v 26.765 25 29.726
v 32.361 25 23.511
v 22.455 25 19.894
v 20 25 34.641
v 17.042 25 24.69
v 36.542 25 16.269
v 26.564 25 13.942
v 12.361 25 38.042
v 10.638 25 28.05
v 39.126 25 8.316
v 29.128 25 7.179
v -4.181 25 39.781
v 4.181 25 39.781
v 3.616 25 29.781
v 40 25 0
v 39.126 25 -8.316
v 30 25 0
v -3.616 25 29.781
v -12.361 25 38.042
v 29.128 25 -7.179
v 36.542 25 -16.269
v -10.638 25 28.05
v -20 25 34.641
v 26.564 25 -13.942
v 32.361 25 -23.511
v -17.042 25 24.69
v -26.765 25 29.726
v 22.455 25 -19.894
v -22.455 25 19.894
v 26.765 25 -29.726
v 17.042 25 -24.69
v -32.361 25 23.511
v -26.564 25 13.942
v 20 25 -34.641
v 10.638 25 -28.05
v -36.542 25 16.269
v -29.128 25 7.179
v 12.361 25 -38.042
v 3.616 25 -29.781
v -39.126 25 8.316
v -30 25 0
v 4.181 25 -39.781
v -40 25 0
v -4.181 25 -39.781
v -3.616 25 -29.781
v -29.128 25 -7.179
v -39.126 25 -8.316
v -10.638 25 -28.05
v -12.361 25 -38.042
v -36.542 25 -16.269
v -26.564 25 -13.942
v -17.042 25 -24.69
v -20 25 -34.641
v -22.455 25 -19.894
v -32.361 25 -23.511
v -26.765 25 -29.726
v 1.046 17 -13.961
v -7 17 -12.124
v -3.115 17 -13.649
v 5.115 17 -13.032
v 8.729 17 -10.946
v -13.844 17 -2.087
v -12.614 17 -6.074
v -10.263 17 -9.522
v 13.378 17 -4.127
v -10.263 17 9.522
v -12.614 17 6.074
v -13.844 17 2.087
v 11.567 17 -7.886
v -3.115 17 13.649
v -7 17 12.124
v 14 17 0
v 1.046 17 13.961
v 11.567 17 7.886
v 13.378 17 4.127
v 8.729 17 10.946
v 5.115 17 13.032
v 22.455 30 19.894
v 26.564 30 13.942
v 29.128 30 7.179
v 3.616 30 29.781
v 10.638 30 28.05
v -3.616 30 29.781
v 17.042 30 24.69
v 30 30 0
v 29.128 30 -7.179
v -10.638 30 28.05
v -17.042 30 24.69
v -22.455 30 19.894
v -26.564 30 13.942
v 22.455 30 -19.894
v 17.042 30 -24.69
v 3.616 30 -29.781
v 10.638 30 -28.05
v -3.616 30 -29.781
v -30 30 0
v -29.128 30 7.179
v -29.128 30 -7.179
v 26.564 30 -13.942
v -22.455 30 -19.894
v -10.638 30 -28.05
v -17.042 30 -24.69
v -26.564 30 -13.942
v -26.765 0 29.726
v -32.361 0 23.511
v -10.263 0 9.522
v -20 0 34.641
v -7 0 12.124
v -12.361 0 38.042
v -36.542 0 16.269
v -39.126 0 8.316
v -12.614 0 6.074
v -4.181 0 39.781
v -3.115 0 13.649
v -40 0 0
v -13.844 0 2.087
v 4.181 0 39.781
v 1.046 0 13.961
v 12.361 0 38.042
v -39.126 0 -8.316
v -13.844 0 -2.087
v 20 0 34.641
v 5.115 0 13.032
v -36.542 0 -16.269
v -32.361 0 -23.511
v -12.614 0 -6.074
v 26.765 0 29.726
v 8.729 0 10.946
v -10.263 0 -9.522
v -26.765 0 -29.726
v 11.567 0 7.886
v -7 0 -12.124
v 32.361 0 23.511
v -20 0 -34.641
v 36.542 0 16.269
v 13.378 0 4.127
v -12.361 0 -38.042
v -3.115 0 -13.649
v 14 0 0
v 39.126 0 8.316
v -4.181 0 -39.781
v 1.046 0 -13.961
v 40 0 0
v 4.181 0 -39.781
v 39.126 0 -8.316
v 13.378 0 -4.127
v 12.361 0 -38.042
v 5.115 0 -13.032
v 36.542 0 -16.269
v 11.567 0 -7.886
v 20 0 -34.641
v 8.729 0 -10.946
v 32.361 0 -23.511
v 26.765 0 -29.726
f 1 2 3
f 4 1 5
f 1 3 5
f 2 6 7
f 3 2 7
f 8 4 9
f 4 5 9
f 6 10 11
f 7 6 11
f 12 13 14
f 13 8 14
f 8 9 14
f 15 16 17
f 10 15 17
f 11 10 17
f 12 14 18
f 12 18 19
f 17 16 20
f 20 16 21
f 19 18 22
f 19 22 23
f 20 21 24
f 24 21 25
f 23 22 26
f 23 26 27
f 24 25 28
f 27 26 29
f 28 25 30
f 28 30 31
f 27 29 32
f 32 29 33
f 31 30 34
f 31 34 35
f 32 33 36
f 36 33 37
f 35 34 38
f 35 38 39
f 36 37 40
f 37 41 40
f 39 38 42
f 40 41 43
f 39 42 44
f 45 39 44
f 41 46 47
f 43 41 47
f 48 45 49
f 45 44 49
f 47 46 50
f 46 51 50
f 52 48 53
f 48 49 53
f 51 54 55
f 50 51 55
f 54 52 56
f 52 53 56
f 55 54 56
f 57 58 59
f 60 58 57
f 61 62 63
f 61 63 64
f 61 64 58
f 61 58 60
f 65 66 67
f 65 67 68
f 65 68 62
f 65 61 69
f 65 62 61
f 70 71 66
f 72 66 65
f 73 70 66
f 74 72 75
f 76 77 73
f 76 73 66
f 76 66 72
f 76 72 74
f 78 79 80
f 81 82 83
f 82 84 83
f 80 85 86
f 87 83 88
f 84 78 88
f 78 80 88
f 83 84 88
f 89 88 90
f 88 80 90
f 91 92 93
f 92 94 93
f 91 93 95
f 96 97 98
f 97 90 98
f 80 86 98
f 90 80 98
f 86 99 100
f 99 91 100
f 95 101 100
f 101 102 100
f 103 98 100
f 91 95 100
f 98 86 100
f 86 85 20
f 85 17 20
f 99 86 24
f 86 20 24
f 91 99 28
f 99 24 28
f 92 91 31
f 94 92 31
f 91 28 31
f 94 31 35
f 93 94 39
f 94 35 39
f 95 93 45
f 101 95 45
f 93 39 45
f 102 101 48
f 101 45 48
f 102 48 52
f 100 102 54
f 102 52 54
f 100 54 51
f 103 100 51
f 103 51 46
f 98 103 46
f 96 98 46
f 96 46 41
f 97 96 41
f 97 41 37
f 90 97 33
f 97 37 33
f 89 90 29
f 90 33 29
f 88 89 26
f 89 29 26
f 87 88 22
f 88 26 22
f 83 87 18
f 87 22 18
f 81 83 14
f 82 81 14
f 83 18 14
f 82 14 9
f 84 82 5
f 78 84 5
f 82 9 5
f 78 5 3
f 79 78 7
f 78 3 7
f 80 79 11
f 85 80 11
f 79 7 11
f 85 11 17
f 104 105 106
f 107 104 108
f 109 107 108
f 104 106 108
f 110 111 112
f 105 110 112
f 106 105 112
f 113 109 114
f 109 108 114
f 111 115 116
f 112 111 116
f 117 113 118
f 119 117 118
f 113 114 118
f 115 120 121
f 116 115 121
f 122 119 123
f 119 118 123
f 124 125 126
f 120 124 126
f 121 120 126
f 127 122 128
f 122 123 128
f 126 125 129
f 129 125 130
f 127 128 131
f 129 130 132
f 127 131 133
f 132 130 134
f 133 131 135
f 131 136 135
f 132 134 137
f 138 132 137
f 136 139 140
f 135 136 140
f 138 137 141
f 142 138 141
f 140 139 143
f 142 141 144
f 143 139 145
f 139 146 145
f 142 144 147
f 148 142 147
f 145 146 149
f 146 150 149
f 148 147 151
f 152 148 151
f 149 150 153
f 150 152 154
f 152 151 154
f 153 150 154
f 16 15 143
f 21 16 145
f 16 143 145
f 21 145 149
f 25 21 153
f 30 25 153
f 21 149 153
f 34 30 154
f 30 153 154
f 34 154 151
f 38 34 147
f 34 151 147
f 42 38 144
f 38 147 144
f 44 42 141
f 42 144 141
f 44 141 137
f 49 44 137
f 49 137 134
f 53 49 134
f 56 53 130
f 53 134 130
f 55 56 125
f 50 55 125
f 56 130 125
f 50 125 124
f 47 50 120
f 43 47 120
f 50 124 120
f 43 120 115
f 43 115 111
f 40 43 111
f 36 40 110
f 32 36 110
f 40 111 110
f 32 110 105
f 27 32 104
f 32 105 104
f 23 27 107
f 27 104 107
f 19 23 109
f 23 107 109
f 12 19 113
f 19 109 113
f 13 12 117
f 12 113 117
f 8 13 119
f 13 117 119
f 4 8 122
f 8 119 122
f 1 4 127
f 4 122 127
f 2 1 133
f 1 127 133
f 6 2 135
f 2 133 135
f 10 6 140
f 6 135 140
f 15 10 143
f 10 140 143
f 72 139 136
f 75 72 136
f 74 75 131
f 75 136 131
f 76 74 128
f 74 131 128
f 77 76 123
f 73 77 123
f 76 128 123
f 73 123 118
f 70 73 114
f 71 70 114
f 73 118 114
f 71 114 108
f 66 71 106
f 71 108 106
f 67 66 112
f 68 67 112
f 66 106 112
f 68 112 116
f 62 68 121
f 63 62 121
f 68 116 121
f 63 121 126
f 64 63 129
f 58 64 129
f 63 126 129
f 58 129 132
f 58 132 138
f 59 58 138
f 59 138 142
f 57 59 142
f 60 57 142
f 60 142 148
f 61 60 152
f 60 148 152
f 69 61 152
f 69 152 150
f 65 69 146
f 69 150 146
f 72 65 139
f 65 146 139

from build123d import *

# Parameters (mm, degrees)
SKETCH2_R          = 14
CUT_EXTRUDE1_DEPTH = 17


with BuildPart() as part:
    # Sketch1 → Revolve1 (revolve)
    with BuildSketch(Plane.XY):
        Polygon((0, 0), (0, 30), (30, 30), (30, 25), (40, 25), (40, 0), align=None)
    revolve(axis=Axis((0, 0, 0), (0, 1, 0)))

    # Sketch2 → Cut-Extrude1 (cut)
    with BuildSketch(Plane.XZ):
        Circle(SKETCH2_R)
    extrude(amount=-CUT_EXTRUDE1_DEPTH, mode=Mode.SUBTRACT)


solid = part.part
